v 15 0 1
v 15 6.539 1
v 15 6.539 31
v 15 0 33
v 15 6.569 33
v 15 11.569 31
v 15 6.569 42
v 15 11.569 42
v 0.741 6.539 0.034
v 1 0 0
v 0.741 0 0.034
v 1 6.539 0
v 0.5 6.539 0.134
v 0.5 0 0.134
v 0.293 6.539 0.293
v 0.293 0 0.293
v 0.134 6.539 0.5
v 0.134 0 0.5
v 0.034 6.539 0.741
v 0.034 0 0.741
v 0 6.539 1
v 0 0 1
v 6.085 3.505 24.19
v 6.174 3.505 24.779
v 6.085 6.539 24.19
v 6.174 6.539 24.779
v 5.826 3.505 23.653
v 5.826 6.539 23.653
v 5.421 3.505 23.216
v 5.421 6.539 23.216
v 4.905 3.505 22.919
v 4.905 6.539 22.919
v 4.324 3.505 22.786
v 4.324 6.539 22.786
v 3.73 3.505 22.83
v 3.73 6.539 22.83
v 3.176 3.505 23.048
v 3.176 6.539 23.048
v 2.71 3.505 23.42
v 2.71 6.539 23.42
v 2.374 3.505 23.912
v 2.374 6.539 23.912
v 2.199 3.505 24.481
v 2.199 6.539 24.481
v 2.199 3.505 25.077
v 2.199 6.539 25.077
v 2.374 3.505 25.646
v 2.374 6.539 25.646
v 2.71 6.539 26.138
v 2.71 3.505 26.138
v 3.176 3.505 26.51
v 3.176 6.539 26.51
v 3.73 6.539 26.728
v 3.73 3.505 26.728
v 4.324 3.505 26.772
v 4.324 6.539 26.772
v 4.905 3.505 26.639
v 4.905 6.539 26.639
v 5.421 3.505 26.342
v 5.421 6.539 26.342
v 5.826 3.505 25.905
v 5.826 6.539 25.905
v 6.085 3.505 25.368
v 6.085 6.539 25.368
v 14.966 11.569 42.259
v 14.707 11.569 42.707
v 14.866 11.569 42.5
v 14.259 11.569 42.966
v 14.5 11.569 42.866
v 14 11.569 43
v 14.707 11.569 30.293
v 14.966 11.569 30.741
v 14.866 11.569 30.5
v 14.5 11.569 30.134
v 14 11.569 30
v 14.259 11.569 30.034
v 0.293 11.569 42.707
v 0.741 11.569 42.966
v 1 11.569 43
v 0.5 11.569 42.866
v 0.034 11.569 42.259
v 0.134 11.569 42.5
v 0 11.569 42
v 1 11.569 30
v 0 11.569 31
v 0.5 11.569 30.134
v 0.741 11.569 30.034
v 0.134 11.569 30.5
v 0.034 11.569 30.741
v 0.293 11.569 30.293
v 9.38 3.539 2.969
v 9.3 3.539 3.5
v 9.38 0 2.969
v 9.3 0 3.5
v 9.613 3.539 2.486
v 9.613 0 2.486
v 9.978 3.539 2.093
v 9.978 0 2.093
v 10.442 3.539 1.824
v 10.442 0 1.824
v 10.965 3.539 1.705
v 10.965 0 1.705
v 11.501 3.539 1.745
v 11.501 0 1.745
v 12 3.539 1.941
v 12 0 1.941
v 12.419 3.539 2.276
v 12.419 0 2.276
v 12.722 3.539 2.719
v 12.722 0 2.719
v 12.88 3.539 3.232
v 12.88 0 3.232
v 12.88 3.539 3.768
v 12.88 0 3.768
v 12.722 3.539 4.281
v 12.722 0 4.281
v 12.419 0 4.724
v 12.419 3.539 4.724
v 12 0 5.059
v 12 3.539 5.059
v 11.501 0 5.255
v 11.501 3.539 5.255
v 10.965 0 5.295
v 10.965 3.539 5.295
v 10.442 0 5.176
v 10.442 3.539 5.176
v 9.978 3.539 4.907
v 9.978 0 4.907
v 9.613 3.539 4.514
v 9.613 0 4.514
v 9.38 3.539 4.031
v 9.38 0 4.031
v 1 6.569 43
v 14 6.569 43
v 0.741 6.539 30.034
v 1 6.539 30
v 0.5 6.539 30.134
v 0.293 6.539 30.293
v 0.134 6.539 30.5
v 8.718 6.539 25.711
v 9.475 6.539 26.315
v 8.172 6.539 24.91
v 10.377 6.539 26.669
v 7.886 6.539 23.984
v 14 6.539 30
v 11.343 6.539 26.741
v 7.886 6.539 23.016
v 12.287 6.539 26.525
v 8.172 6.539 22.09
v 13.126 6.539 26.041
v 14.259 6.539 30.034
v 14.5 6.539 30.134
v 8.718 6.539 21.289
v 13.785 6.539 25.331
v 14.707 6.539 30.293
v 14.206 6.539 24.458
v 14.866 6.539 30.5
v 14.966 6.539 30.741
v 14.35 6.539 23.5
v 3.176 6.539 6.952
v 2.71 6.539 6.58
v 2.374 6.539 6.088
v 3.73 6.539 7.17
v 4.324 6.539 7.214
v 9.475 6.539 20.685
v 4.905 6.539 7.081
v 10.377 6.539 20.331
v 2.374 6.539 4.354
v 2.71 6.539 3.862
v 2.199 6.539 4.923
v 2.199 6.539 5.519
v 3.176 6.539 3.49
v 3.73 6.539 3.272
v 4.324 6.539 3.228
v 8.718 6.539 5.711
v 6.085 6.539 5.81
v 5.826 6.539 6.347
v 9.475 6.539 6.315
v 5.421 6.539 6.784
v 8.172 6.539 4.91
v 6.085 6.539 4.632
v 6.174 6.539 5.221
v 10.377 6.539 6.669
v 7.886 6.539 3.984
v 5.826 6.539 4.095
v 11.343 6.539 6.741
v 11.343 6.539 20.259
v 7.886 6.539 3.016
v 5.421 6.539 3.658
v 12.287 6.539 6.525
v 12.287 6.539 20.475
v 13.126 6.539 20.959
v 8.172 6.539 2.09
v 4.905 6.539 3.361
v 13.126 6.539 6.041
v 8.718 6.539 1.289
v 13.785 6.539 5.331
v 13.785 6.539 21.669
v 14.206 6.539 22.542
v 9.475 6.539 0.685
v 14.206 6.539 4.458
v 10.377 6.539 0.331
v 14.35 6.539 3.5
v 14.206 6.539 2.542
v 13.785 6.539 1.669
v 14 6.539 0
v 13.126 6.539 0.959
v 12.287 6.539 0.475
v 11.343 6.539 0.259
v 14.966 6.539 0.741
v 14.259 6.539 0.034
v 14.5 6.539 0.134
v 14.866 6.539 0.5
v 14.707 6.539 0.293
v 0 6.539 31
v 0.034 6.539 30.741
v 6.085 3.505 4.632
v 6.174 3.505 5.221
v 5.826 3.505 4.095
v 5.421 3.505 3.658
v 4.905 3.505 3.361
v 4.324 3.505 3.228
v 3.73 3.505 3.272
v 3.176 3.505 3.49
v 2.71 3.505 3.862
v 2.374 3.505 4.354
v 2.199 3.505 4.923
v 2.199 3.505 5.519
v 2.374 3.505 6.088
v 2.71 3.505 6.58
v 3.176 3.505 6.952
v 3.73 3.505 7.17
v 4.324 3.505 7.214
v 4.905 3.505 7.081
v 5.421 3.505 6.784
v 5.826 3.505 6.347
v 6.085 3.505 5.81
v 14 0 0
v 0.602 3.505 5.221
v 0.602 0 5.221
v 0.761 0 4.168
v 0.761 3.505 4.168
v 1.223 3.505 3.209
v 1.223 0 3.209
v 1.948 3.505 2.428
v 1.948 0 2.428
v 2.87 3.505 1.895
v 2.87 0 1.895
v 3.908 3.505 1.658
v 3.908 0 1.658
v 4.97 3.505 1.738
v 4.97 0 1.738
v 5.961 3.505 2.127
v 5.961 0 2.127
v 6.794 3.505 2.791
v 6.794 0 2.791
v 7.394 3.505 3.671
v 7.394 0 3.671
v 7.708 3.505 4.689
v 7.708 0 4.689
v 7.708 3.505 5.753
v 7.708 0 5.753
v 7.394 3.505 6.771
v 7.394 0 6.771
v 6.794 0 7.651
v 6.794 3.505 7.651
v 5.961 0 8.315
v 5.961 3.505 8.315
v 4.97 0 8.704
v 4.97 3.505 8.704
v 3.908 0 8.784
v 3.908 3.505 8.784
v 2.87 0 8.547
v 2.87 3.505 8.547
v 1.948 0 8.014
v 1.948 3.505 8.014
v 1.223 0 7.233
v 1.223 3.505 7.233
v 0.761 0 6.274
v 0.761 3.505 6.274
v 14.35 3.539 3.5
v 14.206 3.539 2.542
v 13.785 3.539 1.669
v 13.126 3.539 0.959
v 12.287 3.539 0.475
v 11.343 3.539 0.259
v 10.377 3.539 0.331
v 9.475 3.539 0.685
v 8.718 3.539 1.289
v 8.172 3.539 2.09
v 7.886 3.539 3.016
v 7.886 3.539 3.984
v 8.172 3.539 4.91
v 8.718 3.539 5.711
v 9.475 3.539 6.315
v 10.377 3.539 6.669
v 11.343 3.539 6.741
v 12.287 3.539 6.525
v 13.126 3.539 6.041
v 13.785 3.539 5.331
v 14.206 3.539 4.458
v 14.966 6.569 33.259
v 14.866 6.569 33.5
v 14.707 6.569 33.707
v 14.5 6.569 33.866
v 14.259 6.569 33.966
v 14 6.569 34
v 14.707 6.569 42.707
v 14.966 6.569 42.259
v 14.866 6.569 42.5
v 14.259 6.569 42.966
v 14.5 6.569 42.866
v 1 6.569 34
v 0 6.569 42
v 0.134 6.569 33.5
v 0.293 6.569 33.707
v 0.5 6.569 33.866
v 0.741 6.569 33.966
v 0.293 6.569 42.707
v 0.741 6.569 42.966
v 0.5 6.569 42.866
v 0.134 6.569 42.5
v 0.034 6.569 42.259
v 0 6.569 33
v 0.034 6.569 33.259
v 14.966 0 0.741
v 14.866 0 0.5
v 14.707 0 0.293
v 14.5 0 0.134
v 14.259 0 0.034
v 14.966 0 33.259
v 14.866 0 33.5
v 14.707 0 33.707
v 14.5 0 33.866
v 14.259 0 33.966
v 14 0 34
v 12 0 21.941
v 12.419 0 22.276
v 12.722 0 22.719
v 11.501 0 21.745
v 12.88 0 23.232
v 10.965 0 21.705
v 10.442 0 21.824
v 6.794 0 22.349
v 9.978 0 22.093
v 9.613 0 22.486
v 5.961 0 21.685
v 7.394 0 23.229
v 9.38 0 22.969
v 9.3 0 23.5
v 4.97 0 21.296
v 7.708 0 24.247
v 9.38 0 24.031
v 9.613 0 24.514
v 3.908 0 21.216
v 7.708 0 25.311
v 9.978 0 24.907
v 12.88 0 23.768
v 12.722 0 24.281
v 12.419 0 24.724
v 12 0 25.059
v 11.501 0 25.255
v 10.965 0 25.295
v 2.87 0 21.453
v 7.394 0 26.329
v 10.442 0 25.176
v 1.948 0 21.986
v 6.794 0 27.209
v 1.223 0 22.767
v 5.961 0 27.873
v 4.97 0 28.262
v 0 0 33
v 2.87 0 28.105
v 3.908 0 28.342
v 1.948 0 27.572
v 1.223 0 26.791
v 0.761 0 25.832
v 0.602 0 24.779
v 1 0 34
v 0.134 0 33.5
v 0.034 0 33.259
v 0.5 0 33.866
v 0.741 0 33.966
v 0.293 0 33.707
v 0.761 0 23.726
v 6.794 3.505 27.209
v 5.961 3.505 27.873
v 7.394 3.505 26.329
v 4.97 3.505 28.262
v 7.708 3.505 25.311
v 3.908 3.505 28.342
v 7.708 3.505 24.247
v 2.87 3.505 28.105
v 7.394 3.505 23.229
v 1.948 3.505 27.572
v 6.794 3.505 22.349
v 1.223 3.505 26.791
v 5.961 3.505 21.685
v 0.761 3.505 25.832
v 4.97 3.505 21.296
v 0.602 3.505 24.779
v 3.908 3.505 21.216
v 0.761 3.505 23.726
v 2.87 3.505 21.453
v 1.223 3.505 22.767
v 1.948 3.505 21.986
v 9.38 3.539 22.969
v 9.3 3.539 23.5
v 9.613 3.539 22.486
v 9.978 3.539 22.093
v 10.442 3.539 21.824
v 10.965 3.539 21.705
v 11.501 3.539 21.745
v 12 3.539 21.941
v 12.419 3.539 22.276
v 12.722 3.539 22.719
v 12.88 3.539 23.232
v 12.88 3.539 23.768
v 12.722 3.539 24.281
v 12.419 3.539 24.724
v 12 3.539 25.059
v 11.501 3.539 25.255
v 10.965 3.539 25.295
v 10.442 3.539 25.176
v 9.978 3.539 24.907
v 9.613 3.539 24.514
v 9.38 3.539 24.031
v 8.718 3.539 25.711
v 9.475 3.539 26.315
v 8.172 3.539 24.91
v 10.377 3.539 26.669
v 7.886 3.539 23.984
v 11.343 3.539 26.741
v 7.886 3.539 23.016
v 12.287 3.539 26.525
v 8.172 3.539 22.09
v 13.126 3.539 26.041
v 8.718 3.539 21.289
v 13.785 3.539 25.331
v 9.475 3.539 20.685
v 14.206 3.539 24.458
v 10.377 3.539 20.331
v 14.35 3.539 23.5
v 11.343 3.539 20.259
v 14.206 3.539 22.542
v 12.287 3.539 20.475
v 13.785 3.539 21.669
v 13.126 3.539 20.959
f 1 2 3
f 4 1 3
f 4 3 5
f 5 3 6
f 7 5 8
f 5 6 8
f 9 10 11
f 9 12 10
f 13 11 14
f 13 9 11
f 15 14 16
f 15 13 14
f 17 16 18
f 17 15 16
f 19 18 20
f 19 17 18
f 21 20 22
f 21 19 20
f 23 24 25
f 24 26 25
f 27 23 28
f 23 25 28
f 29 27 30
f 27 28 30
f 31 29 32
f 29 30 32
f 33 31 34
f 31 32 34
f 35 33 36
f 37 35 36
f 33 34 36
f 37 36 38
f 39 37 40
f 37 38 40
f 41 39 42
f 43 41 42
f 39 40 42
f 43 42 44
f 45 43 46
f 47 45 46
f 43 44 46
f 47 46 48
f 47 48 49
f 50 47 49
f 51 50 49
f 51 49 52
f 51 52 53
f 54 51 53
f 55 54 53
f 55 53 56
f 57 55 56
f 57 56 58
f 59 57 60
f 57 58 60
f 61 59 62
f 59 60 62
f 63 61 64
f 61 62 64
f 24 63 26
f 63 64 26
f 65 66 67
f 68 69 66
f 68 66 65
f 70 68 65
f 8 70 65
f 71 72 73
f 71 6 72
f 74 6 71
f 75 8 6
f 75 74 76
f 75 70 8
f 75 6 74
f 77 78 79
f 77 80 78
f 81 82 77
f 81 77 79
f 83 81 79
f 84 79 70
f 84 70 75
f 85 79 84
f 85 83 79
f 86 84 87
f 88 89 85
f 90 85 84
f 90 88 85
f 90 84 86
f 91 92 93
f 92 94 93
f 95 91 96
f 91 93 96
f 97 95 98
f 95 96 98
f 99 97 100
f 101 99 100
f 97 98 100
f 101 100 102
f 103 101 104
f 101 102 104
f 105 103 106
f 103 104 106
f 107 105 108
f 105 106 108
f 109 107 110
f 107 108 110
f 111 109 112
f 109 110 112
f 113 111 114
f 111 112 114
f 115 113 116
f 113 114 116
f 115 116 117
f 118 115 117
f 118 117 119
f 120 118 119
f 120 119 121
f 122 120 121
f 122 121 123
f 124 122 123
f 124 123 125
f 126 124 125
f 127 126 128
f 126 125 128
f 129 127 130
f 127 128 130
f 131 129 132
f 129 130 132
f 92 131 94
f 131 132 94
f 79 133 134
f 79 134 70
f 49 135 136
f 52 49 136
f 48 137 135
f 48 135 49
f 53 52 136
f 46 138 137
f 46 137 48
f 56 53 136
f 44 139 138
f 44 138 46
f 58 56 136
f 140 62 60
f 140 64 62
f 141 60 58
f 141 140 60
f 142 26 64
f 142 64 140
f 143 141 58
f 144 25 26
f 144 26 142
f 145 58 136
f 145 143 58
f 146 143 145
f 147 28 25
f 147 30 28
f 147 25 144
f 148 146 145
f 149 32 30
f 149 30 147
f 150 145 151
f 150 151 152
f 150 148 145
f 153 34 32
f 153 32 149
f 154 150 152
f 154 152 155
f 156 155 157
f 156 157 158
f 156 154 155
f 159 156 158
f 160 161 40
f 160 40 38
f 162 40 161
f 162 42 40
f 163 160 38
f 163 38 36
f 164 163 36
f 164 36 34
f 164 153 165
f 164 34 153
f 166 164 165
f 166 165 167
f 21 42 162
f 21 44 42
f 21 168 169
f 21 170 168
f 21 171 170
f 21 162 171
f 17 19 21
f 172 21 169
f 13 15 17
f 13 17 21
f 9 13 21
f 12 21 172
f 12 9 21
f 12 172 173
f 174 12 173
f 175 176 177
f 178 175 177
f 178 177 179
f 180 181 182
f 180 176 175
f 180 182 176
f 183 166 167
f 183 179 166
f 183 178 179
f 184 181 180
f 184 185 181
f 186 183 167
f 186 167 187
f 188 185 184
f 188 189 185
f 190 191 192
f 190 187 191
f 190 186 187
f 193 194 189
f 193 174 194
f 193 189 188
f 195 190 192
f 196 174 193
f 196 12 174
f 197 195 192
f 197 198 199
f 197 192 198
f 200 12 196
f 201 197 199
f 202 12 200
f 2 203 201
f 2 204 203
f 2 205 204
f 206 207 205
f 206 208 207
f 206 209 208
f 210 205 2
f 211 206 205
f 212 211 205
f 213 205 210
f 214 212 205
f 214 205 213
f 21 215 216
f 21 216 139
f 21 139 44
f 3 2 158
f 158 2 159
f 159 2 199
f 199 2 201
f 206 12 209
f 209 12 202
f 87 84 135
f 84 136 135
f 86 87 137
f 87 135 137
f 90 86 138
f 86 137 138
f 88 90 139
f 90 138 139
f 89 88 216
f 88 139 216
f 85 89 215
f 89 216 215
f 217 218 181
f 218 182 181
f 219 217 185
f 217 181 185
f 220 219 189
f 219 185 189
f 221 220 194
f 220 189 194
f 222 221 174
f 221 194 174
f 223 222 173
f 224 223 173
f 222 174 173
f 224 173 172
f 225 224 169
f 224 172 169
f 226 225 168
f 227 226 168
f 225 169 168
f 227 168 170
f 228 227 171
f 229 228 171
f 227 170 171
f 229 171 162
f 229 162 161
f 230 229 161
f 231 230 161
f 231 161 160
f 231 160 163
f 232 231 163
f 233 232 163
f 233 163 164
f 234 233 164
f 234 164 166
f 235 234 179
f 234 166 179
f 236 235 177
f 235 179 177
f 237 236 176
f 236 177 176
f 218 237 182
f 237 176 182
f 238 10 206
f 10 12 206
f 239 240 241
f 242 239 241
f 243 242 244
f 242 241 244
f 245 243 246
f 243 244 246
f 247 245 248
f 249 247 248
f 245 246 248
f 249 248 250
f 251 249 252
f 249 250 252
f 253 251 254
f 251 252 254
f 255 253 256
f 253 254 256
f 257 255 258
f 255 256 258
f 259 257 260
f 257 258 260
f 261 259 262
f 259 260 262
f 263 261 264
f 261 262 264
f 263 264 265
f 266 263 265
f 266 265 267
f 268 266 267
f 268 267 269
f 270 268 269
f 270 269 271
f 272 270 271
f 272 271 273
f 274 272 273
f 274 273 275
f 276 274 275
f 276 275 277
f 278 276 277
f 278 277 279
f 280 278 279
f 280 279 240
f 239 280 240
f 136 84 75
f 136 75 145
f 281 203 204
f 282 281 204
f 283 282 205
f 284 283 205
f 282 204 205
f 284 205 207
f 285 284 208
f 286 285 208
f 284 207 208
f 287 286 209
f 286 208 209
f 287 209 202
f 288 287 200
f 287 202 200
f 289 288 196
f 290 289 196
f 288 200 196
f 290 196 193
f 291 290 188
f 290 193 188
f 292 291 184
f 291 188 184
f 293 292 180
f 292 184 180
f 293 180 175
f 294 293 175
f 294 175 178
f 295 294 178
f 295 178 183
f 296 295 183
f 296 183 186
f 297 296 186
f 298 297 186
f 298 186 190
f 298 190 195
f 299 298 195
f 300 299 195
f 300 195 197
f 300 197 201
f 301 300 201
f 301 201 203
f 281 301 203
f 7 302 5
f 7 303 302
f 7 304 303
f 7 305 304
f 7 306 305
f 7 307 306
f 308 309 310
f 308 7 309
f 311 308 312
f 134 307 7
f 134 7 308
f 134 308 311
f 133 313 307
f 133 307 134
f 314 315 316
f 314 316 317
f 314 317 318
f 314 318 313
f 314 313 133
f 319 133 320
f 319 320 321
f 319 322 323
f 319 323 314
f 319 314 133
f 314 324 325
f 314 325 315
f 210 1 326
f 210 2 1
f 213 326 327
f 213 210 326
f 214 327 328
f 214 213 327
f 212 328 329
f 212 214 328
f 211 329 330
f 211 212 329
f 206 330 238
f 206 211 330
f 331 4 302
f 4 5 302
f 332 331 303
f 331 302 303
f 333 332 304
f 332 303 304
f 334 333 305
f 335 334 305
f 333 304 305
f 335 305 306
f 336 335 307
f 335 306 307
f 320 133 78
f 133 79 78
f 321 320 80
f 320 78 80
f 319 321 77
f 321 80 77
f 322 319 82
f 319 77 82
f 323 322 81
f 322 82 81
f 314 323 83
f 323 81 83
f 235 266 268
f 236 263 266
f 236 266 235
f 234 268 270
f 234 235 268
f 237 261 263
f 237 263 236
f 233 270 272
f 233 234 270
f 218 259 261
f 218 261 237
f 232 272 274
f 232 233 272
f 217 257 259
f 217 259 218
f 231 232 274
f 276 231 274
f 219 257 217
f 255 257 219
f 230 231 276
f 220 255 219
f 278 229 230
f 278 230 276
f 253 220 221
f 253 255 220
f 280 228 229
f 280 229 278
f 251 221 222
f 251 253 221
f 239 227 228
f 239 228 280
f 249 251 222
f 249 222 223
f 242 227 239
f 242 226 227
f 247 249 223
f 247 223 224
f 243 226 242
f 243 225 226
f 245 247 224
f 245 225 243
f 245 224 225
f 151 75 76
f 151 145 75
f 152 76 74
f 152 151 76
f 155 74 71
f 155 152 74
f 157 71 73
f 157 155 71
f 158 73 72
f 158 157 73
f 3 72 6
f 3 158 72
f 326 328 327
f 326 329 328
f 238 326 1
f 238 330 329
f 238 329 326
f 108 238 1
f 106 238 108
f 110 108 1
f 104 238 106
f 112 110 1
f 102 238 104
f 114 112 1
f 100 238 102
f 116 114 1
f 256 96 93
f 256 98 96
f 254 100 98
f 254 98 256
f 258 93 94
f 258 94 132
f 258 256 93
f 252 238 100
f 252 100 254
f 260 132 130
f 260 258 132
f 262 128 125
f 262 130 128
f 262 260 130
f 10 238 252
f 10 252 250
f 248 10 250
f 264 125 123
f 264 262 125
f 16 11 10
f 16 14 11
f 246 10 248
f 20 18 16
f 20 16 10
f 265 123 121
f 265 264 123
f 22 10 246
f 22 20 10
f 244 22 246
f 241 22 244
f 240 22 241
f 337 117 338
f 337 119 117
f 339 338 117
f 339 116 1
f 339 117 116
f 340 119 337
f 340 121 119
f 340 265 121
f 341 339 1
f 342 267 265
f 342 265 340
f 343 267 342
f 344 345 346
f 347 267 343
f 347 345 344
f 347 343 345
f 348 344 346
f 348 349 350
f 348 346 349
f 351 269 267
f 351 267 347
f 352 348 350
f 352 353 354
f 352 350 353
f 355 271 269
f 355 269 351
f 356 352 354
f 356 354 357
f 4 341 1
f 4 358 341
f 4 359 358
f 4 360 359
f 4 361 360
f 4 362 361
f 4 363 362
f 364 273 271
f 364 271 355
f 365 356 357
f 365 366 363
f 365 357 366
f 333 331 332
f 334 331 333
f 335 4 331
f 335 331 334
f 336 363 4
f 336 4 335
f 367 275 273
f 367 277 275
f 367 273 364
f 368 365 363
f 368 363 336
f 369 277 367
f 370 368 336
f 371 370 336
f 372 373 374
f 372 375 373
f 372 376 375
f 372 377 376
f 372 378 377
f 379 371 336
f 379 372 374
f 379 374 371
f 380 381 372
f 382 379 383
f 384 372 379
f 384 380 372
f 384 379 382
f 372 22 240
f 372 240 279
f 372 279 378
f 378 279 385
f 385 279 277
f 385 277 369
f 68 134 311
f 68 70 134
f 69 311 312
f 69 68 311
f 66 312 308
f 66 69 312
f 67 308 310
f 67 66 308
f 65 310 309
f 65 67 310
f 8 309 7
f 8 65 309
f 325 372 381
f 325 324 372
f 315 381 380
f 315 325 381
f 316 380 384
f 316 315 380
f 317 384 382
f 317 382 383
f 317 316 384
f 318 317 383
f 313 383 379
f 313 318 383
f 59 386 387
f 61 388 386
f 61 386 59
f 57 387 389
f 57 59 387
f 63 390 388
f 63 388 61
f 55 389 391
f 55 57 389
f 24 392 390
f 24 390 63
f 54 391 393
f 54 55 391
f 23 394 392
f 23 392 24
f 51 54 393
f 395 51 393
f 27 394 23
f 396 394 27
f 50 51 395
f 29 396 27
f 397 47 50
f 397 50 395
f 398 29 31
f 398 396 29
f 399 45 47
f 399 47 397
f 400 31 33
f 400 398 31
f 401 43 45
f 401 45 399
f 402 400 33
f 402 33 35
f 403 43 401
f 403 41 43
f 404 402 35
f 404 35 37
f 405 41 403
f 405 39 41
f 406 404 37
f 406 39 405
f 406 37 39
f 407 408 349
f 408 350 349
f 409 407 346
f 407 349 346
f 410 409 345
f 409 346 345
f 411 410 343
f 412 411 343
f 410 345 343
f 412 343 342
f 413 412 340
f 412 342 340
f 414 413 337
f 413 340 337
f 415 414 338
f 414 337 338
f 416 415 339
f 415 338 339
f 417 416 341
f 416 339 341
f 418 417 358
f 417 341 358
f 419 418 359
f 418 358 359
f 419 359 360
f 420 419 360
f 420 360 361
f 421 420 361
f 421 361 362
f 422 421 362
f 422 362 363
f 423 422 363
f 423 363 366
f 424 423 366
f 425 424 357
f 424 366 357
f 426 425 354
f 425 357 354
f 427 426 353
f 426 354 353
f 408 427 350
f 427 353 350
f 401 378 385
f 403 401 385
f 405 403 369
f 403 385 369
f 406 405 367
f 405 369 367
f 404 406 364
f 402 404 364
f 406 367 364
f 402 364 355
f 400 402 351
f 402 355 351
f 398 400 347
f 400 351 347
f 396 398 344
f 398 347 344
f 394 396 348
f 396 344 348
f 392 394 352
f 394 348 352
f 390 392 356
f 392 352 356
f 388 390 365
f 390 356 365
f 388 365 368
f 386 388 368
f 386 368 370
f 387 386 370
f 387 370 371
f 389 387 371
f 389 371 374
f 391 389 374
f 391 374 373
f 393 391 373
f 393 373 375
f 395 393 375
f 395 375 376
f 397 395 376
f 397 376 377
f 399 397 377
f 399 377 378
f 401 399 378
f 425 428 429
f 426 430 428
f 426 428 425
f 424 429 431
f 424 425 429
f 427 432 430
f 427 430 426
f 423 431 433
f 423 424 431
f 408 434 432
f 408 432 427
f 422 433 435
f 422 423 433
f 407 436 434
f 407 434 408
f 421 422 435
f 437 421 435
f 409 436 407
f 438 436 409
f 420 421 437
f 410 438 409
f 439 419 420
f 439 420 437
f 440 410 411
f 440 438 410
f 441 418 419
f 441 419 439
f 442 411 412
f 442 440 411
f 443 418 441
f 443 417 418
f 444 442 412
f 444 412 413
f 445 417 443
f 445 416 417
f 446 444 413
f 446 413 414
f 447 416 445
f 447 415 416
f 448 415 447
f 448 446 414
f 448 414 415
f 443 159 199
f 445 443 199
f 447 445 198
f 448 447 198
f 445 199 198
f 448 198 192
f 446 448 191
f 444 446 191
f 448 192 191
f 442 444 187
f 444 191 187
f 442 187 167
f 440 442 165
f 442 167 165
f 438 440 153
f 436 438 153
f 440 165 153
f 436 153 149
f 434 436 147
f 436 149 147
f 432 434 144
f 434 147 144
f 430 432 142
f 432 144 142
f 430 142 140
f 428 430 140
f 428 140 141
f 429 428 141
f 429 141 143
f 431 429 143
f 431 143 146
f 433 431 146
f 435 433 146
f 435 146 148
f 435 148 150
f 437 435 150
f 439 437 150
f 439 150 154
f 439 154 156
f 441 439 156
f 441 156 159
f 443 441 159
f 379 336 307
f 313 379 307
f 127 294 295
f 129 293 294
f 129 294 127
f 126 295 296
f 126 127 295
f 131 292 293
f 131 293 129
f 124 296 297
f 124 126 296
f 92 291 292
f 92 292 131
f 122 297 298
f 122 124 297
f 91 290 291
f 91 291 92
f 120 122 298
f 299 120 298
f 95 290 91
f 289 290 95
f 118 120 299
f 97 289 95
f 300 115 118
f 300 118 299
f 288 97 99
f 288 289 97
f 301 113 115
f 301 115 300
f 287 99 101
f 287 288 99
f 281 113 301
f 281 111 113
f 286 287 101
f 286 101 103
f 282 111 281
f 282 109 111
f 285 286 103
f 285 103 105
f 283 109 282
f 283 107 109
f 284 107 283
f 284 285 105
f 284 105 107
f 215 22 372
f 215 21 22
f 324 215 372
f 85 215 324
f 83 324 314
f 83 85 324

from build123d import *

# Parameters (mm, degrees)
SKETCH1_W                                      = 15
SKETCH1_H                                      = 6.539
BOSS_EXTRUDE1_DEPTH                            = 30
CBORE_FOR_M3_SHCS1_D                           = 3.6
CBORE_FOR_M3_SHCS1_CBORE_D                     = 6.5
CBORE_FOR_M3_SHCS1_CBORE_DEPTH                 = 3
CBORE_FOR_6_SOCKET_HEAD_CAP_SCREW1_D           = 3.997300108
CBORE_FOR_6_SOCKET_HEAD_CAP_SCREW1_CBORE_D     = 7.14502
CBORE_FOR_6_SOCKET_HEAD_CAP_SCREW1_CBORE_DEPTH = 3.5052
BOSS_EXTRUDE2_DEPTH                            = 15
FILLET1_R                                      = 1


with BuildPart() as part:
    # Sketch1 → Boss-Extrude1 (new body)
    with BuildSketch(Plane.XY):
        with Locations((7.5, 3.2695)):
            Rectangle(SKETCH1_W, SKETCH1_H)
    extrude(amount=BOSS_EXTRUDE1_DEPTH)

    # CBORE for M3 SHCS1 (through all)
    with Locations(Plane(origin=(0, 6.539, 0), x_dir=(1, 0, 0), z_dir=(0, 1, 0))):
        with Locations((11.1, -3.5), (11.1, -23.5)):
            CounterBoreHole(CBORE_FOR_M3_SHCS1_D / 2, CBORE_FOR_M3_SHCS1_CBORE_D / 2, CBORE_FOR_M3_SHCS1_CBORE_DEPTH)

    # CBORE for #6 Socket Head Cap Screw1 (through all)
    with Locations(Plane(origin=(0, 0, 0), x_dir=(-1, 0, 0), z_dir=(0, -1, 0))):
        with Locations((-4.175, -24.779), (-4.175, -5.221)):
            CounterBoreHole(CBORE_FOR_6_SOCKET_HEAD_CAP_SCREW1_D / 2, CBORE_FOR_6_SOCKET_HEAD_CAP_SCREW1_CBORE_D / 2, CBORE_FOR_6_SOCKET_HEAD_CAP_SCREW1_CBORE_DEPTH)

    # Sketch6 → Boss-Extrude2 (add)
    with BuildSketch(Plane.ZY):
        Polygon((30, 0), (34, 0), (34, 6.569), (43, 6.569), (43, 11.569), (30, 11.569), align=None)
    extrude(amount=-BOSS_EXTRUDE2_DEPTH)

    # Fillet1
    fillet1_edges = [part.edges().sort_by_distance(p)[0] for p in [
        (0, 9.054, 30),
        (0, 3.2845, 34),
        (0, 9.069, 43),
        (15, 9.054, 30),
        (15, 9.069, 43),
        (15, 3.2845, 34),
        (15, 3.2695, 0),
        (0, 3.2695, 0),
    ]]
    fillet(fillet1_edges, radius=FILLET1_R)


solid = part.part
